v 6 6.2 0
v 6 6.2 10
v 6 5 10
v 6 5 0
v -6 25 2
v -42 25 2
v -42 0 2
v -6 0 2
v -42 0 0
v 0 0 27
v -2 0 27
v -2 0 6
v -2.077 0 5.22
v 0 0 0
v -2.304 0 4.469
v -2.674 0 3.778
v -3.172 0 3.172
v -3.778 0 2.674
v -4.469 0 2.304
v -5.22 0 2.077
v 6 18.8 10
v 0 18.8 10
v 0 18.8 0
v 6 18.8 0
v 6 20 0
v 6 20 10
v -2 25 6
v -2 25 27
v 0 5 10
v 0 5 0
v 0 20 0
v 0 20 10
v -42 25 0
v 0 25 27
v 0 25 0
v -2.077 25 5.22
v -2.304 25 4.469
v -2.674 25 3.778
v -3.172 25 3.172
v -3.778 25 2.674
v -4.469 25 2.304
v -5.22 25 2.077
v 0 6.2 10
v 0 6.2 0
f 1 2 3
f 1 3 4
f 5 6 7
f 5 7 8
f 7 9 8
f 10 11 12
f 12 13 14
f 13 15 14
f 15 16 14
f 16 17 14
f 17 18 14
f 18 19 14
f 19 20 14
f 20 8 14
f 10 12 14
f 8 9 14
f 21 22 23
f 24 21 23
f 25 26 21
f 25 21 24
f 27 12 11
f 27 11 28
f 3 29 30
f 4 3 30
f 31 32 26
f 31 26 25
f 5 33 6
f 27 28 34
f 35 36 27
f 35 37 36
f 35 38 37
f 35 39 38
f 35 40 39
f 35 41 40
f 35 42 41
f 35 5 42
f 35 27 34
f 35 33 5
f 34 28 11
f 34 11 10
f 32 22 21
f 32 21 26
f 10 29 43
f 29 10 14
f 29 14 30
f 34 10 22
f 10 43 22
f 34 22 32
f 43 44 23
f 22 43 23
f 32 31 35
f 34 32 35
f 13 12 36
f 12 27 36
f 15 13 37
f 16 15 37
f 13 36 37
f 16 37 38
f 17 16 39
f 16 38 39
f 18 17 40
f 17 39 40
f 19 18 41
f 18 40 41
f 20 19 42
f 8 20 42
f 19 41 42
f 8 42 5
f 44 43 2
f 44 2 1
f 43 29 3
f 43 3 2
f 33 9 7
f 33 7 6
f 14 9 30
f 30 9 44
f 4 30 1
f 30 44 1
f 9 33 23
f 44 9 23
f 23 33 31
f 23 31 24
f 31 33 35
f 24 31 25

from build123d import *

# Parameters (mm, degrees)
SKETCH1_W           = 42
SKETCH1_H           = 25
BOSS_EXTRUDE1_DEPTH = 2
SKETCH2_W           = 2
SKETCH2_H           = 25
BOSS_EXTRUDE2_DEPTH = 25
SKETCH3_W           = 10
SKETCH3_H           = 1.2
BOSS_EXTRUDE3_DEPTH = 6
FILLET1_R           = 4


with BuildPart() as part:
    # Sketch1 → Boss-Extrude1 (new body)
    with BuildSketch(Plane.XY):
        with Locations((-21, 12.5)):
            Rectangle(SKETCH1_W, SKETCH1_H)
    extrude(amount=BOSS_EXTRUDE1_DEPTH)

    # Sketch2 → Boss-Extrude2 (add)
    with BuildSketch(Plane.XY.offset(2)):
        with Locations((-1, 12.5)):
            Rectangle(SKETCH2_W, SKETCH2_H)
    extrude(amount=BOSS_EXTRUDE2_DEPTH)

    # Sketch3 → Boss-Extrude3 (add)
    with BuildSketch(Plane(origin=(0, 0, 0), x_dir=(0, 0, -1), z_dir=(1, 0, 0))):
        with Locations((-5, 19.4)):
            Rectangle(SKETCH3_W, SKETCH3_H)
        with Locations((-5, 5.6)):
            Rectangle(SKETCH3_W, SKETCH3_H)
    extrude(amount=BOSS_EXTRUDE3_DEPTH)

    # Fillet1
    fillet1_edges = [part.edges().sort_by_distance(p)[0] for p in [
        (-2, 12.5, 2),
    ]]
    fillet(fillet1_edges, radius=FILLET1_R)


solid = part.part
